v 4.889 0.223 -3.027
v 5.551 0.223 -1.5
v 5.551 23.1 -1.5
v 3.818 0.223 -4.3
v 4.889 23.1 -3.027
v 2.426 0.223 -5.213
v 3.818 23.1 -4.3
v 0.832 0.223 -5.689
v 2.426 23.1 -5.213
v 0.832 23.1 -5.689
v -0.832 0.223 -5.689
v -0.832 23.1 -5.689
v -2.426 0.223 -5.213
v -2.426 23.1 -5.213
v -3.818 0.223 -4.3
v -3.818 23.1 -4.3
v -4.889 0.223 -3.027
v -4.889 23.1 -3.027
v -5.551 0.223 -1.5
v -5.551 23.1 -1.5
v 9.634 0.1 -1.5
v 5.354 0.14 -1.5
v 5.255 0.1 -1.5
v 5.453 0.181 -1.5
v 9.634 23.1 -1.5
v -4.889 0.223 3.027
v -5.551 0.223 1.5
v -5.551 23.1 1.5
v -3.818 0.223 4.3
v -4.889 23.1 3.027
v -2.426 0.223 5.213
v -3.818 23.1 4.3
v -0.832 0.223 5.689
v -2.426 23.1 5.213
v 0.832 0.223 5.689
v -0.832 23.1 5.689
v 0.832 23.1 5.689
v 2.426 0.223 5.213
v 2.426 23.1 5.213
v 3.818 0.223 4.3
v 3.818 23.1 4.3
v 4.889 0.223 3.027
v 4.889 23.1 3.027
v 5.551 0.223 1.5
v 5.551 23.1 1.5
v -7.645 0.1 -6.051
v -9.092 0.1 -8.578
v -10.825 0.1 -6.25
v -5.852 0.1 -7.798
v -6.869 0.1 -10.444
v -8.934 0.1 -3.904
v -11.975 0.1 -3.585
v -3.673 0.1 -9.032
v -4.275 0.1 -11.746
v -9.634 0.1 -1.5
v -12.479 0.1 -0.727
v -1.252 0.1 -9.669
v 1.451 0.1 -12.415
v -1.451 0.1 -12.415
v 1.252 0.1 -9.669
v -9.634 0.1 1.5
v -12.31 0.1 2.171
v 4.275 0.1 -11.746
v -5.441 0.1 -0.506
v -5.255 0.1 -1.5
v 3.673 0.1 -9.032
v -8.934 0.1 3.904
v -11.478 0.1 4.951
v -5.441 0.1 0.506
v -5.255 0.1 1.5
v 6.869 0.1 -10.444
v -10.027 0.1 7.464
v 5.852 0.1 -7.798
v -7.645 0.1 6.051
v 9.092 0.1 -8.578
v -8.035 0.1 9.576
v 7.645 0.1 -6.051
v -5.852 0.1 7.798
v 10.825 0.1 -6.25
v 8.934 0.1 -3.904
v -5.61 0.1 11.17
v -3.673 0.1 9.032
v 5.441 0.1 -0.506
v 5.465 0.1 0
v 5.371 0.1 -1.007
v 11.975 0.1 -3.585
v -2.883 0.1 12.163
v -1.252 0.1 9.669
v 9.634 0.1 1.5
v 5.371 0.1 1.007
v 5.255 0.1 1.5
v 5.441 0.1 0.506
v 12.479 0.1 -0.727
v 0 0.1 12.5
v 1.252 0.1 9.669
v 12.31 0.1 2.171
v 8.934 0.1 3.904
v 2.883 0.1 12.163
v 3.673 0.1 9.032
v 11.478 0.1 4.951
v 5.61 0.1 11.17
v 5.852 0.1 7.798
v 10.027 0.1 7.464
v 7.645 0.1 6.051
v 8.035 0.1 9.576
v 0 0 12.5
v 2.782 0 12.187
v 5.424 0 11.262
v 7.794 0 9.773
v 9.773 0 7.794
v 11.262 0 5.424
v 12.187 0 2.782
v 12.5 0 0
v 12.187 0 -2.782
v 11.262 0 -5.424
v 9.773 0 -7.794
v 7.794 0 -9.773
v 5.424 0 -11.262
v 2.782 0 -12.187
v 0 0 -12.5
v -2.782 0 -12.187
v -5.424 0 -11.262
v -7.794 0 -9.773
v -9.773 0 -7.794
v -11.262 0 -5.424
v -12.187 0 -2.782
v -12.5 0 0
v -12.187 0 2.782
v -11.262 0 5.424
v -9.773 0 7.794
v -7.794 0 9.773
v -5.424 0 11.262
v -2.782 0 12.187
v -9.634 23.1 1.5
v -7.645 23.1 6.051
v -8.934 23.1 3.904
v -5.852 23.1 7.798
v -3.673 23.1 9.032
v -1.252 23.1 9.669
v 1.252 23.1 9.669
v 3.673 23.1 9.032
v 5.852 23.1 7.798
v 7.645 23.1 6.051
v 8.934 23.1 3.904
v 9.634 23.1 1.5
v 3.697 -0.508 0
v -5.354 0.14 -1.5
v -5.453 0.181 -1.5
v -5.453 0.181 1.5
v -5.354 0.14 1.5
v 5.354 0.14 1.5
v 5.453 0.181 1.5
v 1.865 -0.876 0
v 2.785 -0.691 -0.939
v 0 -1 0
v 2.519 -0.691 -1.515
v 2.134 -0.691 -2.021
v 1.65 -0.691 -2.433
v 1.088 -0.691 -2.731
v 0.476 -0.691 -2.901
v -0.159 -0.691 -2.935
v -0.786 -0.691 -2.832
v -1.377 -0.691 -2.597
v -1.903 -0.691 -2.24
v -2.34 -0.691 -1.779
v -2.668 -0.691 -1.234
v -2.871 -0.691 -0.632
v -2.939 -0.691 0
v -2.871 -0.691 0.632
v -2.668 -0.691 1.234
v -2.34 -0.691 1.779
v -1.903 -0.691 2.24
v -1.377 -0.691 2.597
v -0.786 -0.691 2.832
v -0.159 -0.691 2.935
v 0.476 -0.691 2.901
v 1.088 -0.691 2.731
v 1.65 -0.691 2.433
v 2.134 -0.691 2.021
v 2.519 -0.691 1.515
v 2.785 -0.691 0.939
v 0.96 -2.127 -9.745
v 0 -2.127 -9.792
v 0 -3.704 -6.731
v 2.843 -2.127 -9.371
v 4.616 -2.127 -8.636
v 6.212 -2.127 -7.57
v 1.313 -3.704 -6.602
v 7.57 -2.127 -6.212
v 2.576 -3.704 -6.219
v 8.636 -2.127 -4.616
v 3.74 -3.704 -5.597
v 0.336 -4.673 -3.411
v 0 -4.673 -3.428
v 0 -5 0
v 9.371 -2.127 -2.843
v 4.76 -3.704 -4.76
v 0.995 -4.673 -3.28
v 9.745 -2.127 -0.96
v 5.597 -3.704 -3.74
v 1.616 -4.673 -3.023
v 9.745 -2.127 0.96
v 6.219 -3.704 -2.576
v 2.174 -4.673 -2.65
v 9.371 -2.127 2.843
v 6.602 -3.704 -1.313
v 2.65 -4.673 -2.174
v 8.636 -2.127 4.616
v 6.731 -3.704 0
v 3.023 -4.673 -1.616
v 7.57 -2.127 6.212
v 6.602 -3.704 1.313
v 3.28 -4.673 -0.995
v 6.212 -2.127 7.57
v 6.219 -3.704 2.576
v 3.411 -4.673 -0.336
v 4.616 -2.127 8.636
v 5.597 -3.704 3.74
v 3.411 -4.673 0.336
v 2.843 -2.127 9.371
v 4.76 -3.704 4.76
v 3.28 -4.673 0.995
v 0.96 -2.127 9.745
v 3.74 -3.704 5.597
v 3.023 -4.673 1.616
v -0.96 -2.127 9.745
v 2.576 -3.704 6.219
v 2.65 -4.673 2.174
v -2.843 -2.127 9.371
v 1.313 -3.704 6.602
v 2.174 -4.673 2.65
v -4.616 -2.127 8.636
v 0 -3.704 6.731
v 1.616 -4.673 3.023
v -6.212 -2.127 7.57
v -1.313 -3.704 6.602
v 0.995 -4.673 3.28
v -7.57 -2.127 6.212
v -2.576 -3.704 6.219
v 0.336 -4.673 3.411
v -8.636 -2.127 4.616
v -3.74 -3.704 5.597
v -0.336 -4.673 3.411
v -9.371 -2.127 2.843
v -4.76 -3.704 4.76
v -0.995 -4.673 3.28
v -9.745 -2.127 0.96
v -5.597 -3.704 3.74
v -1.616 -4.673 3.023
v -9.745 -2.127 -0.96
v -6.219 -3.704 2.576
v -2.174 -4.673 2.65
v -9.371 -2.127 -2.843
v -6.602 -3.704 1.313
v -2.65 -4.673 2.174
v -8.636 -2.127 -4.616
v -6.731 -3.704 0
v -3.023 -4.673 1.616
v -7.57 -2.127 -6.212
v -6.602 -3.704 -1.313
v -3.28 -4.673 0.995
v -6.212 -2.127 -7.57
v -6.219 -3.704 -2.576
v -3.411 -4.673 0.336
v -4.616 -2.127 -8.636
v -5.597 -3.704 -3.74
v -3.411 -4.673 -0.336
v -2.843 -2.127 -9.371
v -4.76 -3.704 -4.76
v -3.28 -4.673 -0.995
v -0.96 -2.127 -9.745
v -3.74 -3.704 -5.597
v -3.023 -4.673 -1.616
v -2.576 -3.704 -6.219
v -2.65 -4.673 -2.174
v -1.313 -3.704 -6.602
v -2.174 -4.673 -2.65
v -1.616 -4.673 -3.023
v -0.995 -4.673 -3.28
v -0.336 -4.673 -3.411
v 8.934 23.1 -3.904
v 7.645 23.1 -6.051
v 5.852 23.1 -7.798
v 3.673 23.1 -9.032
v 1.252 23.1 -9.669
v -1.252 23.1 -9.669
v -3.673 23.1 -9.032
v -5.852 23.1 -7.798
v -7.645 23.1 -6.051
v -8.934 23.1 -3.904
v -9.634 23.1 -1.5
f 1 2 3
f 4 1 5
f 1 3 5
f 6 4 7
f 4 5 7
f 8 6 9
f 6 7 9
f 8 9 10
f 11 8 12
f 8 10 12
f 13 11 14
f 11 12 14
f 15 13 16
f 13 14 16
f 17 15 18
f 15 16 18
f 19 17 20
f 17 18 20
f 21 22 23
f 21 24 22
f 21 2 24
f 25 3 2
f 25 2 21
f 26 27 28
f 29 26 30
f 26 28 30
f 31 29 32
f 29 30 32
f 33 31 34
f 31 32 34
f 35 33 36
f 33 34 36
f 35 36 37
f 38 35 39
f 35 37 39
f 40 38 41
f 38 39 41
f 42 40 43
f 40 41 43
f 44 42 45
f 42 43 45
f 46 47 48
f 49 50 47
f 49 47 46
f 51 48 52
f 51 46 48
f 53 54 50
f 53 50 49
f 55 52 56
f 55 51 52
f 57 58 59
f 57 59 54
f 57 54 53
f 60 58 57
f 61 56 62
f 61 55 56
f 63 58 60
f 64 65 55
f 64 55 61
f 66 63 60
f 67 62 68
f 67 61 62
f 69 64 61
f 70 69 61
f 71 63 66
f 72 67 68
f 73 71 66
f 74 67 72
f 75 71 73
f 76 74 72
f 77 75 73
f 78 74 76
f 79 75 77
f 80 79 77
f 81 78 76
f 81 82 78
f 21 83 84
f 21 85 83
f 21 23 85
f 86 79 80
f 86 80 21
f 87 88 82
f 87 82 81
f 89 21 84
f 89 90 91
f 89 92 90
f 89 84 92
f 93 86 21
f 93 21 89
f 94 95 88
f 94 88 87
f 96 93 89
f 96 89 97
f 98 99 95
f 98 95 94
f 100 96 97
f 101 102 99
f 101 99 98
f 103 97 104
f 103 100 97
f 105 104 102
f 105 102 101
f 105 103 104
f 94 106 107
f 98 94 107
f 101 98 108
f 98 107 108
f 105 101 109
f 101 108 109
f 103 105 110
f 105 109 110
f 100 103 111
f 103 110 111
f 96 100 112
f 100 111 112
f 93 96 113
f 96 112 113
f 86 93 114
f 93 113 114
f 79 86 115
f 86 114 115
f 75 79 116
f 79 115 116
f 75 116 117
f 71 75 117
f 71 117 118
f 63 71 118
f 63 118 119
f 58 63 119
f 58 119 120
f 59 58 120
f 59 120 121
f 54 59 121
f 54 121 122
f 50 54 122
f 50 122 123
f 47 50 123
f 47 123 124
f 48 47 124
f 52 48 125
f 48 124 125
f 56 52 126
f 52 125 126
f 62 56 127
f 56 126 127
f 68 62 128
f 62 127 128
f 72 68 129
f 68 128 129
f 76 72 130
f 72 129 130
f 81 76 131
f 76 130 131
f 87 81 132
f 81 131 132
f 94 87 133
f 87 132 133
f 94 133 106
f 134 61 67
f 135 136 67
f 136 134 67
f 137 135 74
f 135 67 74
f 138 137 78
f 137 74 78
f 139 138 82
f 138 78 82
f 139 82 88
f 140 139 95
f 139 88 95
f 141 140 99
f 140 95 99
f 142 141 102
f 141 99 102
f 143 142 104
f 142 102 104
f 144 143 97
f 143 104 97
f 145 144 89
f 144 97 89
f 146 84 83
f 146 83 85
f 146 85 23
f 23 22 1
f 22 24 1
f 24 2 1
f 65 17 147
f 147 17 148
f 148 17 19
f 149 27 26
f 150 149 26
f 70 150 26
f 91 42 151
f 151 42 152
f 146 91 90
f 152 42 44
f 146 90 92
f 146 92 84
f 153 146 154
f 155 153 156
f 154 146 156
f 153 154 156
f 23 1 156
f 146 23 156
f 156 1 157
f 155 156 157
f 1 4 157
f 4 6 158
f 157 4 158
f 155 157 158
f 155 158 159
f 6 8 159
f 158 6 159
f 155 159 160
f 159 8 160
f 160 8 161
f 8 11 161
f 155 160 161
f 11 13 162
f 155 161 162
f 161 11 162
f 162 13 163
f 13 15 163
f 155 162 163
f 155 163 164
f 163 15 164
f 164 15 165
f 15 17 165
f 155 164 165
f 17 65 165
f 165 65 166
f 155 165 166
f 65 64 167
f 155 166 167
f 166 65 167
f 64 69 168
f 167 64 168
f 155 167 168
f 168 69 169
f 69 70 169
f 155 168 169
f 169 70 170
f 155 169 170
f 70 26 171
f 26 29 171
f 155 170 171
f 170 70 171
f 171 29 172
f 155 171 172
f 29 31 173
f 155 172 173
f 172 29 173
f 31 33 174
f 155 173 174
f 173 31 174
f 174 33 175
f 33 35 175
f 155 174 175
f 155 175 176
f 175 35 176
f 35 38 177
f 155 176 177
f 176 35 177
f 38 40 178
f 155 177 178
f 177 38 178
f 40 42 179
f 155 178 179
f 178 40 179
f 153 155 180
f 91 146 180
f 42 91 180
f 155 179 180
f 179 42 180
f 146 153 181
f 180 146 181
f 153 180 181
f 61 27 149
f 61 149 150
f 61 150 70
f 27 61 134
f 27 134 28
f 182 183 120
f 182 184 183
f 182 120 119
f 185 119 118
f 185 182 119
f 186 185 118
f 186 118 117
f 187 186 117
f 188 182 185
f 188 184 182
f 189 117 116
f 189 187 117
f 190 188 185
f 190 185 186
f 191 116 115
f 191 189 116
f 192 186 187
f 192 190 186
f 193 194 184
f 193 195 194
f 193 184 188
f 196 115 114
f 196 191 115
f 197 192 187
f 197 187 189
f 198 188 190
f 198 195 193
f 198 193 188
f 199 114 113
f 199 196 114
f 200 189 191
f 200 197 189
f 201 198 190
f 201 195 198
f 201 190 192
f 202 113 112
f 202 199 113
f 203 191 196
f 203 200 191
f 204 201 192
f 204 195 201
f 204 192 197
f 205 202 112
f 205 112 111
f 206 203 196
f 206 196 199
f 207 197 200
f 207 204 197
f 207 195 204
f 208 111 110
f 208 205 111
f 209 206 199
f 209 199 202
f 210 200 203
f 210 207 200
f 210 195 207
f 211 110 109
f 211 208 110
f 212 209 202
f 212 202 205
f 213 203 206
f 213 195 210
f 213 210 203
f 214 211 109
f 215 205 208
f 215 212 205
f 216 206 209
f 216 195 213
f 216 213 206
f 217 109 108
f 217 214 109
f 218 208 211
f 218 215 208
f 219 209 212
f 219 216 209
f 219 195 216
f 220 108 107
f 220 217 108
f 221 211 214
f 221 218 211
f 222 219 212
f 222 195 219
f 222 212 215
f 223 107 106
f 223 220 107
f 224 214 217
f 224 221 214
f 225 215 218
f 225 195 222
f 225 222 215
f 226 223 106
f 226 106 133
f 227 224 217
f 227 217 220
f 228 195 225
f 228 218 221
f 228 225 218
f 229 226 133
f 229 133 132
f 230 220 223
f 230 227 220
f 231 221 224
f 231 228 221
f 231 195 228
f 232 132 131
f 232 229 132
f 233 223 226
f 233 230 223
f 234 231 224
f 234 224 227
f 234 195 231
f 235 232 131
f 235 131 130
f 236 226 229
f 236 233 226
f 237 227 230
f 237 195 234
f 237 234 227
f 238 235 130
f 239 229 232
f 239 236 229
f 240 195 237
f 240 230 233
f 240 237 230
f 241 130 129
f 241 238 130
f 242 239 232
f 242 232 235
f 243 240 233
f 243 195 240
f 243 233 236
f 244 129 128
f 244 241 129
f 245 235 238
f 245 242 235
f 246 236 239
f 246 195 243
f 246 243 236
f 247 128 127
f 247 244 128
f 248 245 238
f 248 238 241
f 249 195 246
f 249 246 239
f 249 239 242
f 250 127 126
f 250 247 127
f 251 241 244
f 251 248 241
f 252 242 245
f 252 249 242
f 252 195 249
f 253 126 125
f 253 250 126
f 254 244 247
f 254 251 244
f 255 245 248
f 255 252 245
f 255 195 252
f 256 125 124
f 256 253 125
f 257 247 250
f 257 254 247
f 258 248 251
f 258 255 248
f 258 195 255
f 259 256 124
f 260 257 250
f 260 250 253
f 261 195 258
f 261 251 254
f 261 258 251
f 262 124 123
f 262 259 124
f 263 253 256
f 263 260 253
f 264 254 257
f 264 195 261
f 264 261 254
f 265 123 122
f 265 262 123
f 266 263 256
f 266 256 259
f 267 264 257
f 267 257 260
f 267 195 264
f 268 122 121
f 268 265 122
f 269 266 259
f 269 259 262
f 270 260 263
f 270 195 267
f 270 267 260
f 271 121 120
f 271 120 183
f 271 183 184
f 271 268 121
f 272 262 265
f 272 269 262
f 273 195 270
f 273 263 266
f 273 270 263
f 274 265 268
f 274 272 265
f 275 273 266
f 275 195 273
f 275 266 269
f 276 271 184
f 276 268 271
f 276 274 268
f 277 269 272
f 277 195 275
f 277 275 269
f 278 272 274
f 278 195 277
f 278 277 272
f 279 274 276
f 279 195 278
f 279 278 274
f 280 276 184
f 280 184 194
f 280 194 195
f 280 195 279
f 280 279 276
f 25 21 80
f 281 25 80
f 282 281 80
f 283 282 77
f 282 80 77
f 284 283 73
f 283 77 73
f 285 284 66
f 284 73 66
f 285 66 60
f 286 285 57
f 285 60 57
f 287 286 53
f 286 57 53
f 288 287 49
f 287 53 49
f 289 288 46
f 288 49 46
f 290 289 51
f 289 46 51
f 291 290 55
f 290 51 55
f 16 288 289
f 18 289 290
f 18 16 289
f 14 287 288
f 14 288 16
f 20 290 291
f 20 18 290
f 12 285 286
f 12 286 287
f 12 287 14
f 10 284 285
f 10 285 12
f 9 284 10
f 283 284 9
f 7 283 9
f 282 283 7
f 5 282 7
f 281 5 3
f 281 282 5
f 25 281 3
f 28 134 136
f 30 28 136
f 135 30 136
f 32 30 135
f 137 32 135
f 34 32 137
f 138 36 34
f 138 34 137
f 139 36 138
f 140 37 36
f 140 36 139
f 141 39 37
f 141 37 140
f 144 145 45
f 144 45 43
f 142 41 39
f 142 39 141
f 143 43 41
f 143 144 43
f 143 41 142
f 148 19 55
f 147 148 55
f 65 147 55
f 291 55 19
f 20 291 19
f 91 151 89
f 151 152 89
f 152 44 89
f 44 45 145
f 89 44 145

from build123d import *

# Parameters (mm, degrees)
SKETCH1_R           = 12.5
BOSS_EXTRUDE1_DEPTH = 0.1
DOME1_FACE_RADIUS   = 12.5
DOME1_HEIGHT        = 5
SKETCH2_R           = 9.75
BOSS_EXTRUDE2_DEPTH = 23
CUT_EXTRUDE1_REACH  = 35.198
SKETCH3_W           = 22.394577403
SKETCH3_H           = 3


# Read off the part's stored shape, not the designer's step: Shell3
with BuildPart() as part:
    # Sketch1 → Boss-Extrude1 (new body)
    with BuildSketch(Plane(origin=(0, 0, 0), x_dir=(1, 0, 0), z_dir=(0, 1, 0))):
        with Locations(Location((0, 0, 0), (0, 0, 270))):
            Circle(SKETCH1_R)
    extrude(amount=BOSS_EXTRUDE1_DEPTH)

    # Dome1: a dome of height H over a round flat face of radius A is a cap of a sphere of radius (A * A + H * H) / (2 * H)
    dome1_r = (DOME1_FACE_RADIUS * DOME1_FACE_RADIUS + DOME1_HEIGHT * DOME1_HEIGHT) / (2 * DOME1_HEIGHT)
    dome1_base = Plane((0, 0, 0), z_dir=(0, -1, 0))
    with Locations(dome1_base.offset(DOME1_HEIGHT - dome1_r)):
        dome1_ball = Sphere(dome1_r, mode=Mode.PRIVATE)
    add(split(dome1_ball, bisect_by=dome1_base, keep=Keep.TOP, mode=Mode.PRIVATE))

    # Sketch2 → Boss-Extrude2 (add)
    with BuildSketch(Plane(origin=(0, 0.1, 0), x_dir=(1, 0, 0), z_dir=(0, 1, 0))):
        with Locations(Location((0, 0, 0), (0, 0, 270))):
            Circle(SKETCH2_R)
    extrude(amount=BOSS_EXTRUDE2_DEPTH)

    # Shell3 outline → Shell3 (revolve, cut)
    with BuildSketch(Plane.XY):
        with BuildLine():
            Line((0, 23.1), (0, -1))
            ThreePointArc((0, -1), (2.939346569, -0.690783248), (5.750000013, 0.223328602))
            Line((5.750000013, 0.223328602), (5.75, 23.1))
            Line((5.75, 23.1), (0, 23.1))
        make_face()
    revolve(axis=Axis((0, 0, 0), (0, 1, 0)), mode=Mode.SUBTRACT)

    # Cut-Extrude1: up to this face of the body (flat: up to its plane)
    cut_extrude1_end = Plane(part.part.faces().sort_by_distance((0, 0.1, -12.146446609))[0])
    # Sketch3 → Cut-Extrude1 (cut, up to the picked face)
    with BuildSketch(Plane(origin=(0, 23.1, 0), x_dir=(1, 0, 0), z_dir=(0, 1, 0)), mode=Mode.PRIVATE) as cut_extrude1_sk1:
        with Locations((0.557168459, 0)):
            Rectangle(SKETCH3_W, SKETCH3_H)
    cut_extrude1_tool1 = split(extrude(cut_extrude1_sk1.sketch, amount=-CUT_EXTRUDE1_REACH, mode=Mode.PRIVATE), bisect_by=cut_extrude1_end, keep=Keep.BOTH, mode=Mode.PRIVATE)
    add(cut_extrude1_tool1.solids().sort_by(Axis((0.557168, 23.1, 0), (0, -1, 0)))[0], mode=Mode.SUBTRACT)


solid = part.part
